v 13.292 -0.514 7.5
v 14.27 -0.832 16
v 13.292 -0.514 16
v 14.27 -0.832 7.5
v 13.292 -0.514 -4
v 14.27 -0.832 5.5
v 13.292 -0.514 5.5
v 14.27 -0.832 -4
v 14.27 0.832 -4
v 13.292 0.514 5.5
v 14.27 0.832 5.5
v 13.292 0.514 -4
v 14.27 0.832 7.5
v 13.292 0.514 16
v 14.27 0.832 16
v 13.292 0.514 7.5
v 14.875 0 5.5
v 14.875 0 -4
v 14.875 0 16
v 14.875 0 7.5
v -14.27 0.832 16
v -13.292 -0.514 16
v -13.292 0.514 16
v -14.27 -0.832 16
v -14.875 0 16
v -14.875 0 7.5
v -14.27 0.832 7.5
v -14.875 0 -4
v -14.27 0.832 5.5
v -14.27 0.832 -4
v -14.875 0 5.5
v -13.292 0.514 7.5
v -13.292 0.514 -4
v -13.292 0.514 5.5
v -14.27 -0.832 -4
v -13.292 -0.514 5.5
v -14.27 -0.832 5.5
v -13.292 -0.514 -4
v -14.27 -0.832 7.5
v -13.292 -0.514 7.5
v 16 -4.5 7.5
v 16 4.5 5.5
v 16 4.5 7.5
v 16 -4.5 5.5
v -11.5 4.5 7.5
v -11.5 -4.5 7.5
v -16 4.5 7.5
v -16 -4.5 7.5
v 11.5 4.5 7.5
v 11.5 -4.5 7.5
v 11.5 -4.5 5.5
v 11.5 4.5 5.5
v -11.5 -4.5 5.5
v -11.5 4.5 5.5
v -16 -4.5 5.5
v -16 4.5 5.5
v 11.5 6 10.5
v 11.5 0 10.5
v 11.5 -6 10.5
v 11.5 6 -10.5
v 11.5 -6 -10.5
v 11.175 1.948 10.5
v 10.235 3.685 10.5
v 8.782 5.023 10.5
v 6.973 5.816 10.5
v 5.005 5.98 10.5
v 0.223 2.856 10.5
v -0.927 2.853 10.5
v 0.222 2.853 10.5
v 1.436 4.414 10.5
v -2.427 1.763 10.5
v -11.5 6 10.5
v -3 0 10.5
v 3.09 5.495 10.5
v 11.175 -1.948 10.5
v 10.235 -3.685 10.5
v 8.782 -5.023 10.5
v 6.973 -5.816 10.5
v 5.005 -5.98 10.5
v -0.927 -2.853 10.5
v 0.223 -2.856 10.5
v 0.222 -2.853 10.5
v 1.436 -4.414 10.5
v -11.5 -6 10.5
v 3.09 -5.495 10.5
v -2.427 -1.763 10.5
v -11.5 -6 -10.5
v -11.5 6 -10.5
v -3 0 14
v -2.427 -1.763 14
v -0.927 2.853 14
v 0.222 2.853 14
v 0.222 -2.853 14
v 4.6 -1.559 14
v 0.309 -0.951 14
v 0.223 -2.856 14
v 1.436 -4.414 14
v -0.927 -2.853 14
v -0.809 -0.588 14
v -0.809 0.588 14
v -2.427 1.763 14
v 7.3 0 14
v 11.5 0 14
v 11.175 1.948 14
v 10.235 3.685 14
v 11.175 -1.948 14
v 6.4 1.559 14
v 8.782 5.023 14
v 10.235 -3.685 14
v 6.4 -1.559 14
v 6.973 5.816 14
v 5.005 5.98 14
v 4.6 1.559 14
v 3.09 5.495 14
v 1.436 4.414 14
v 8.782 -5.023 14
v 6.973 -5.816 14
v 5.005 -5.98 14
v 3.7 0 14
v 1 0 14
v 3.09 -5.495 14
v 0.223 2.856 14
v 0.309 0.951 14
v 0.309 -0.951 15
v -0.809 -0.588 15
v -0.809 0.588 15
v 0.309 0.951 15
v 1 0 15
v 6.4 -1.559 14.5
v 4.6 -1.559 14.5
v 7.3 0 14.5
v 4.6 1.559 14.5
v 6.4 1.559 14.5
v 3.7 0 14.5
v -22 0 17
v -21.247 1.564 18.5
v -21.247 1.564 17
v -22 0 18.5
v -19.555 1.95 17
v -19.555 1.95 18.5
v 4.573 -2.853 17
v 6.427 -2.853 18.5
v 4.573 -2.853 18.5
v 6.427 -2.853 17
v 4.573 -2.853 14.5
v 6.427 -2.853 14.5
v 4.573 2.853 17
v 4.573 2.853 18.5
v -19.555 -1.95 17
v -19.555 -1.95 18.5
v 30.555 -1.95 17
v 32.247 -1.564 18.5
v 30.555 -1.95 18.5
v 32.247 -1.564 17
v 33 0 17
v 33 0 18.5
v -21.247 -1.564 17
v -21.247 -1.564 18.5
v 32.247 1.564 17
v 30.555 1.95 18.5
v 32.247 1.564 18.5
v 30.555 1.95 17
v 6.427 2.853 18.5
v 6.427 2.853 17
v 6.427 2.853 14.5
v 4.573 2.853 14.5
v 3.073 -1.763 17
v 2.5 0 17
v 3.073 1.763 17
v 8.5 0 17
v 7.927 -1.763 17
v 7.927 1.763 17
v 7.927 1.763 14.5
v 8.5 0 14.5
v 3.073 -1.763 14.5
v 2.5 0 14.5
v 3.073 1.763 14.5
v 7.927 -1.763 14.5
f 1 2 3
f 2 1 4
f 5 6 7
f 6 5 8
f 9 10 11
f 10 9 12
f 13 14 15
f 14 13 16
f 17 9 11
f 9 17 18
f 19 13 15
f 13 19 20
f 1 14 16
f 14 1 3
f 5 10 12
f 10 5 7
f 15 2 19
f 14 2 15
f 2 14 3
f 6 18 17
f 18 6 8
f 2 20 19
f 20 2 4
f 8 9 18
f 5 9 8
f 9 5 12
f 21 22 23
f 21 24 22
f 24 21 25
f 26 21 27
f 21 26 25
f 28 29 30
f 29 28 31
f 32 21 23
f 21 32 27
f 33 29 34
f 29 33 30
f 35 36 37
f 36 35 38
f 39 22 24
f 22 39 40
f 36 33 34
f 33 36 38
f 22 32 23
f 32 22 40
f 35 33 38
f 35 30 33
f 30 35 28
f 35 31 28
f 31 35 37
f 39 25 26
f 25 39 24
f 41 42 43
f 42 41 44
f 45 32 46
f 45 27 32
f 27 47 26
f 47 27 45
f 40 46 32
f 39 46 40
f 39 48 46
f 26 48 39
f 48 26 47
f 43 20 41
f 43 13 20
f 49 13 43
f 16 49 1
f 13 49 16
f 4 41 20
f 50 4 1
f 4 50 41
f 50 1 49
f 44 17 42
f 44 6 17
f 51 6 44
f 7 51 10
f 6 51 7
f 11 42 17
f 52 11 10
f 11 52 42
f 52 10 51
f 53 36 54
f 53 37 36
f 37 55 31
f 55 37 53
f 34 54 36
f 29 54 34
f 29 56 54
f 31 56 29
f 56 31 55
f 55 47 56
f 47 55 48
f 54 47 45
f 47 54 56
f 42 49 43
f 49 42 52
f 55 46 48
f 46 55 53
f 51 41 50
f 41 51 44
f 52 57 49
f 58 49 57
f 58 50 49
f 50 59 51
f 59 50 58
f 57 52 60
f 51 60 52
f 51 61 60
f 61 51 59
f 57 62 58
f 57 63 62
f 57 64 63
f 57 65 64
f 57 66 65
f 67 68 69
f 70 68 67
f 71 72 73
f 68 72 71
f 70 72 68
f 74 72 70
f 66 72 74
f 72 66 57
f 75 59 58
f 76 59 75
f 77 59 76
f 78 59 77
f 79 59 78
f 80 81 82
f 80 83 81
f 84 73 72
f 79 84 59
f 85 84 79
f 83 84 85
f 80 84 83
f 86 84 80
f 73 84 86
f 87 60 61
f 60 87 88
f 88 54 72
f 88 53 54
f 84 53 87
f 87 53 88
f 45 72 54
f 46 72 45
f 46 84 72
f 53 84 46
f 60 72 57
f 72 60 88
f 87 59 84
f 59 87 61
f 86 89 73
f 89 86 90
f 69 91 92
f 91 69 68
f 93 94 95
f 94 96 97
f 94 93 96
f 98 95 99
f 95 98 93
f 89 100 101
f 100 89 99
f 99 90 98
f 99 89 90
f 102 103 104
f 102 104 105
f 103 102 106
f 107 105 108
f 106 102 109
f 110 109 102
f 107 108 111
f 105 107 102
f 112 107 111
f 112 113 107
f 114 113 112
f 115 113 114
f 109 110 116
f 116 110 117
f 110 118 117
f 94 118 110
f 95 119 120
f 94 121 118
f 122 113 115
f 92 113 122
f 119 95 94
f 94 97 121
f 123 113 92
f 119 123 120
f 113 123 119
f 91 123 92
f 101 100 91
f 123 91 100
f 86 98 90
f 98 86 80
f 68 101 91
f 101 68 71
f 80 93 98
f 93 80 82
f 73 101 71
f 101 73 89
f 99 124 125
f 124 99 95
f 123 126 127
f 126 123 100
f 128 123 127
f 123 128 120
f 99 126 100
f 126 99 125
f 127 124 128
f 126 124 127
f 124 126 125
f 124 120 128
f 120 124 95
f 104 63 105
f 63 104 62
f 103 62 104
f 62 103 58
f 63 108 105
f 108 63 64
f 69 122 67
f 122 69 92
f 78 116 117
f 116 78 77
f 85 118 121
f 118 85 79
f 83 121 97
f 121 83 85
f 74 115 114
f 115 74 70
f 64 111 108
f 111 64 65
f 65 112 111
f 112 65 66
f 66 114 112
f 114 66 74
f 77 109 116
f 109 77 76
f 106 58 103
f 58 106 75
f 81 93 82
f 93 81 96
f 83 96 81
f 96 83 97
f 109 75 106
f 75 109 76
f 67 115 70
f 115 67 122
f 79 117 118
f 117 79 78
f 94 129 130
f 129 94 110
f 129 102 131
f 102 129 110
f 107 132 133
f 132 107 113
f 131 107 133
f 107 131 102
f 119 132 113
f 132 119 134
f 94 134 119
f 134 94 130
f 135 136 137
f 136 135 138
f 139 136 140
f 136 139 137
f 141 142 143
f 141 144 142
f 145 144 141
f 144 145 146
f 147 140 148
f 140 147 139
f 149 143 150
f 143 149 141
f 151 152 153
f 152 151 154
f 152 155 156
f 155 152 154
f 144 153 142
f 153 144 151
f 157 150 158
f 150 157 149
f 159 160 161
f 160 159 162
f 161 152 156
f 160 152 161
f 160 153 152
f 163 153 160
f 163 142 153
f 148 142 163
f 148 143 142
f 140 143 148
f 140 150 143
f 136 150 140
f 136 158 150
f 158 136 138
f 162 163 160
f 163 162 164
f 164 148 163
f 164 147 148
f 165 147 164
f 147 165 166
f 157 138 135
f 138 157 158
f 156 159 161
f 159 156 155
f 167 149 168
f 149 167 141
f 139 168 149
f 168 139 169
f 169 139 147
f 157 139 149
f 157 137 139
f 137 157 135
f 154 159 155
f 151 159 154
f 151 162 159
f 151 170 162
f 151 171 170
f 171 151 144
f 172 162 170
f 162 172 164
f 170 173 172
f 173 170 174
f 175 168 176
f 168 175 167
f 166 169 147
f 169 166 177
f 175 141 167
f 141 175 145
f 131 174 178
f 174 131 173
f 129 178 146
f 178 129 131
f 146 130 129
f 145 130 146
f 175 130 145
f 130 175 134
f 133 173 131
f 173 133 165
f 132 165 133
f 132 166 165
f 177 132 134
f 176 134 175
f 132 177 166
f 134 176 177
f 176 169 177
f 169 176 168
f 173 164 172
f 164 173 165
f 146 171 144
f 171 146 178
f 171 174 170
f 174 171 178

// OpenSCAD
// file: utils.scad
module clone_mirror(axis) {
    children();
    mirror(axis)
    children();
}

module clone_translate(axis) {
    children();
    translate(axis)
    children();
}
// main file
use <utils.scad>

$servo_draglift_offset = 5.5;

function get_servo_draglift_offset() = $servo_draglift_offset;

module draglift() {
    color("white") {
        hull() {
            cylinder(1.5,3,3);
            clone_mirror([1,0,0]) translate([25.5,0,0]) cylinder(1.5,2,2);
        }
        mirror([0,0,1]) cylinder(2.5,3,3);
    }
}

module draglift_holder() {
    difference() {
        union() {
            cube([30, 5, 2]);
            clone_mirror([1,0,0]) clone_mirror([0,1,0])
                cube([30, 5, 2]);
        }
        draglift();
    }
}

module draglift_holder_aligned_to_servo() {
    translate([$servo_draglift_offset,0,17]) draglift_holder();
}

//draglift_holder();

module servo_screws() {
    color("gray") clone_mirror([1,0,0]) translate([14,0,6]) 
        cylinder(20,1.75/2,1.75/2, center=true);
}
servo_screws();

module servo(draw_draglift=true, draglift_angle=0) {
    color("blue") {
        cube([23,12,21], center=true);
        difference() {
            translate([0,0,6.5]) cube([32,9,2], center=true);
            servo_screws();
        }
        translate([0,0,10.5]) cylinder(3.5, 3, 3);
        translate([0,0,14]) cylinder(1,1,1);
    }
    translate([$servo_draglift_offset,0,10.5]) {
        color("blue") cylinder(3.5,6,6);
        color("white") cylinder(6,1.8,1.8);
    }
    if (draw_draglift)
        translate([$servo_draglift_offset,0,17]) rotate([0,0,draglift_angle]) draglift();
}

servo();
